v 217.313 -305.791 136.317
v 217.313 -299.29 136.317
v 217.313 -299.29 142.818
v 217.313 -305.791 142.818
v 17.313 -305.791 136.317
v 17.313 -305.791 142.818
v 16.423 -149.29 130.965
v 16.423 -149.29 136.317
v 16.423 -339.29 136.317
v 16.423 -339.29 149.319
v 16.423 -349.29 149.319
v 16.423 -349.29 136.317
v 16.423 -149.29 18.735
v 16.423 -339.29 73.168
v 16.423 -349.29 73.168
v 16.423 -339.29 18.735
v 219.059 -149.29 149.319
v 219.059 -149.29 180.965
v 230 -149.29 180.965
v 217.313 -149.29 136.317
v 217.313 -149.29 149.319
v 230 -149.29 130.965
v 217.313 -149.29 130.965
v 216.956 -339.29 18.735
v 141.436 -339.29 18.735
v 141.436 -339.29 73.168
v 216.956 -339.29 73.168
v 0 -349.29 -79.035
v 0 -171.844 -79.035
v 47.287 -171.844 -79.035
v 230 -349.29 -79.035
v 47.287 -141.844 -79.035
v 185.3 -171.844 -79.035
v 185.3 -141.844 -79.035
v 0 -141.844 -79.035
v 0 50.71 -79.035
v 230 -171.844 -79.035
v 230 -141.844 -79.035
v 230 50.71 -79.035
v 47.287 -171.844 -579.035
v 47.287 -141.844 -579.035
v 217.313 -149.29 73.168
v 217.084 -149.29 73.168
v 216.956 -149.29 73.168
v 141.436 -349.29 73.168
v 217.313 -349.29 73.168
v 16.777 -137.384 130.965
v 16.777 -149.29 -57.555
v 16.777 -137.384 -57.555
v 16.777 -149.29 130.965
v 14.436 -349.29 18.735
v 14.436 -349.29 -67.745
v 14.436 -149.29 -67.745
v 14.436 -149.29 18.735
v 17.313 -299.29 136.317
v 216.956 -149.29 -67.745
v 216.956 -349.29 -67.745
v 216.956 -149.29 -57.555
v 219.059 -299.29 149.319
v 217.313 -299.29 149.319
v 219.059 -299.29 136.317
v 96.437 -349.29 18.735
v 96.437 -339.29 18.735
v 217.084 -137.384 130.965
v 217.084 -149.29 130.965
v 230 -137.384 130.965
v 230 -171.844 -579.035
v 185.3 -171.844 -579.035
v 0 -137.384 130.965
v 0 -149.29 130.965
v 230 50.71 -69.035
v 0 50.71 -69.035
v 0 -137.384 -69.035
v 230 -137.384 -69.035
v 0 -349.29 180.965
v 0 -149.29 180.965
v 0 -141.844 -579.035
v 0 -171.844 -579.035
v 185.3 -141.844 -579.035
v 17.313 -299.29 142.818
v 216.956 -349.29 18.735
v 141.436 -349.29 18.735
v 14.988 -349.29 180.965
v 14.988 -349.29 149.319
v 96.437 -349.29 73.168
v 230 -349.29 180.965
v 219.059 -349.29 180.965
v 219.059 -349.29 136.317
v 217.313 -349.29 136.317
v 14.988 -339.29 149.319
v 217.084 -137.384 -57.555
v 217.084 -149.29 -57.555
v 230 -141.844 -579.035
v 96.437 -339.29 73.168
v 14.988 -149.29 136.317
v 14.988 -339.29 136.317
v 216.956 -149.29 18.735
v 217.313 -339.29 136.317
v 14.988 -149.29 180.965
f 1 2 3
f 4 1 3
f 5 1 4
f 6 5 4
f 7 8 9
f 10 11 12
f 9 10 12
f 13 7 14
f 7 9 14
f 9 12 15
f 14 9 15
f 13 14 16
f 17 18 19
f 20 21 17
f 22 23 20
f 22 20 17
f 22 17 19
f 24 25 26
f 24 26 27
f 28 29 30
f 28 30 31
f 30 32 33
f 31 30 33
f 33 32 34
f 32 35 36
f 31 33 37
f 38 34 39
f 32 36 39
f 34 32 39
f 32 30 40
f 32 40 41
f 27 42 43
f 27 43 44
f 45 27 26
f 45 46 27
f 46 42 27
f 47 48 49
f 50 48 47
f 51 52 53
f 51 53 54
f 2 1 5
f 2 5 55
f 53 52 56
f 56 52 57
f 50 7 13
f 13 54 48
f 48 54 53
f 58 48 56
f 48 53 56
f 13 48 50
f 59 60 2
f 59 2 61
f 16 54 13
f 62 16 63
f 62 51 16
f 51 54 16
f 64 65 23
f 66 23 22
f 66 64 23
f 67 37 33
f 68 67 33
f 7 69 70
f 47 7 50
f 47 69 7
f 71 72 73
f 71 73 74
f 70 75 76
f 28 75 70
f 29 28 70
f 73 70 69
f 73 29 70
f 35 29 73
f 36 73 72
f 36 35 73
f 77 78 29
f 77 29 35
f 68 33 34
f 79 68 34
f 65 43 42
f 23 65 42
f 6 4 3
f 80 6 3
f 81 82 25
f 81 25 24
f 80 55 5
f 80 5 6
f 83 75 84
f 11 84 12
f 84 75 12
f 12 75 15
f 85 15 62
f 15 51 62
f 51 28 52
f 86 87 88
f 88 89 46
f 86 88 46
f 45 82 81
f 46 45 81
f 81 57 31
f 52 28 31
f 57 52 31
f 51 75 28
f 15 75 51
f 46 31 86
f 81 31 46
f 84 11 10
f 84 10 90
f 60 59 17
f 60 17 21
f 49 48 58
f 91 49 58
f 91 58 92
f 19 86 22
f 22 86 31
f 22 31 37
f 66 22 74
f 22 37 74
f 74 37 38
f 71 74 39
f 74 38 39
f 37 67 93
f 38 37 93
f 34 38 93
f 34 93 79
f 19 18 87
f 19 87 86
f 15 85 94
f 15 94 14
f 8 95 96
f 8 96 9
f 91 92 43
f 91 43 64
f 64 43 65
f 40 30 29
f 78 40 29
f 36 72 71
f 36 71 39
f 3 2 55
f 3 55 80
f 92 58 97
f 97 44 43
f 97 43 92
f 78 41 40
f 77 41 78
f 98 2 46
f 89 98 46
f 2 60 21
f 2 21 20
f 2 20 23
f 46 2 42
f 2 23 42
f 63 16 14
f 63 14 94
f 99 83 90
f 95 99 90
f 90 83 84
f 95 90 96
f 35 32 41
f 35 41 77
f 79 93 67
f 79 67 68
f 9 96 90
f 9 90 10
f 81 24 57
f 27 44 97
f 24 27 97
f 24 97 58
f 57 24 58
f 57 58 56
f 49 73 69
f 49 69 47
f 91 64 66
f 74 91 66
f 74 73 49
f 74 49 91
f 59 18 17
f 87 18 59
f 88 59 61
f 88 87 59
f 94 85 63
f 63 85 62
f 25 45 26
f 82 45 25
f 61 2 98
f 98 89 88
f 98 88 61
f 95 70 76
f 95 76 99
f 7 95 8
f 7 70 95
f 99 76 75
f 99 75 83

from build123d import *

# Parameters (mm, degrees)
SKETCH_1_W           = 10
SKETCH_1_H           = 200
EXTRUDE_1_DEPTH      = 230
SKETCH_3_W           = 230
SKETCH_3_H           = 10
EXTRUDE_2_DEPTH      = 200
SKETCH_4_W           = 230
SKETCH_4_H           = 200
EXTRUDE_3_DEPTH      = 250
SKETCH_5_W           = 39.107317094
SKETCH_5_H           = 28.520826202
EXTRUDE_4_DEPTH      = 600
SKETCH_6_W           = 42.946967528
SKETCH_6_H           = 25.292733119
EXTRUDE_5_DEPTH      = 600
SKETCH_8_W           = 204.071070321
SKETCH_8_H           = 31.645680933
CUT_EXTRUDE_1_DEPTH  = 600
SKETCH_9_W           = 200.890651603
SKETCH_9_H           = 63.14903284
CUT_EXTRUDE_2_DEPTH  = 600
SKETCH_10_W          = 202.520583334
SKETCH_10_H          = 86.479719268
CUT_EXTRUDE_3_DEPTH  = 600
SKETCH_11_W          = 44.998390002
SKETCH_11_H          = 54.43327072
CUT_EXTRUDE_4_DEPTH  = 600
SKETCH_12_W          = 80.01436718
SKETCH_12_H          = 54.43327072
CUT_EXTRUDE_6_DEPTH  = 190
SKETCH_13_W          = 75.520724131
SKETCH_13_H          = 54.43327072
CUT_EXTRUDE_7_DEPTH  = 190
SKETCH_14_W          = 202.325132129
SKETCH_14_H          = 13.002129503
CUT_EXTRUDE_8_DEPTH  = 190
SKETCH_15_W          = 230
SKETCH_15_H          = 11.90568545
EXTRUDE_6_DEPTH      = 200
SKETCH_16_W          = 200.306698776
SKETCH_16_H          = 188.520008931
CUT_EXTRUDE_9_DEPTH  = 50
SKETCH_17_W          = 202.636589795
SKETCH_17_H          = 13.002129503
CUT_EXTRUDE_10_DEPTH = 50
SKETCH_18_W          = 6.501064751
SKETCH_18_H          = 6.501064751
EXTRUDE_9_DEPTH      = 200
SKETCH_19_W          = 39.107317094
SKETCH_19_H          = 50
CUT_EXTRUDE_11_DEPTH = 1000
SKETCH_20_W          = 42.946967528
SKETCH_20_H          = 50
CUT_EXTRUDE_12_DEPTH = 1000
SKETCH_21_W          = 39.107317094
SKETCH_21_H          = 50
CUT_EXTRUDE_13_DEPTH = 1000
SKETCH_22_W          = 42.946967528
SKETCH_22_H          = 50
CUT_EXTRUDE_14_DEPTH = 1000
SKETCH_23_W          = 39.107317094
SKETCH_23_H          = 28.520826202
CUT_EXTRUDE_15_DEPTH = 500
SKETCH_24_W          = 42.946967528
SKETCH_24_H          = 25.292733119
CUT_EXTRUDE_16_DEPTH = 500
SKETCH_25_W          = 44.7
SKETCH_25_H          = 30
SKETCH_25_W_2        = 47.286683307
EXTRUDE_10_DEPTH     = 500


with BuildPart() as part:
    # 草图1 → 凸台-拉伸1 (new body)
    with BuildSketch(Plane(origin=(0, 0, 0), x_dir=(0, 0, -1), z_dir=(1, 0, 0))):
        with Locations((74.034934024, -49.289724413)):
            Rectangle(SKETCH_1_W, SKETCH_1_H)
    extrude(amount=EXTRUDE_1_DEPTH)

    # 草图3 → 凸台-拉伸2 (add)
    with BuildSketch(Plane.XZ.offset(149.289724413)):
        with Locations((115, -74.034934024)):
            Rectangle(SKETCH_3_W, SKETCH_3_H)
    extrude(amount=EXTRUDE_2_DEPTH)

    # 草图4 → 凸台-拉伸3 (add)
    with BuildSketch(Plane.XY.offset(-69.034934024)):
        with Locations((115, -249.289724413)):
            Rectangle(SKETCH_4_W, SKETCH_4_H)
    extrude(amount=EXTRUDE_3_DEPTH)

    # 草图5 → 凸台-拉伸4 (add)
    with BuildSketch(Plane(origin=(0, 0, -79.034934024), x_dir=(-1, 0, 0), z_dir=(0, 0, -1))):
        with Locations((-19.553658547, -97.170506203)):
            Rectangle(SKETCH_5_W, SKETCH_5_H)
    extrude(amount=EXTRUDE_4_DEPTH)

    # 草图6 → 凸台-拉伸5 (add)
    with BuildSketch(Plane(origin=(0, 0, -79.034934024), x_dir=(-1, 0, 0), z_dir=(0, 0, -1))):
        with Locations((-208.526516236, -89.203945076)):
            Rectangle(SKETCH_6_W, SKETCH_6_H)
    extrude(amount=EXTRUDE_5_DEPTH)

    # 草图8 → 切除-拉伸1 (cut)
    with BuildSketch(Plane(origin=(0, -349.289724413, 0), x_dir=(-1, 0, 0), z_dir=(0, -1, 0))):
        with Locations((-117.023802755, -165.14222551)):
            Rectangle(SKETCH_8_W, SKETCH_8_H)
    extrude(amount=-CUT_EXTRUDE_1_DEPTH, mode=Mode.SUBTRACT)

    # 草图9 → 切除-拉伸2 (cut)
    with BuildSketch(Plane(origin=(0, -349.289724413, 0), x_dir=(-1, 0, 0), z_dir=(0, -1, 0))):
        with Locations((-116.868073921, -104.74273912)):
            Rectangle(SKETCH_9_W, SKETCH_9_H)
    extrude(amount=-CUT_EXTRUDE_2_DEPTH, mode=Mode.SUBTRACT)

    # 草图10 → 切除-拉伸3 (cut)
    with BuildSketch(Plane.XZ.offset(349.289724413)):
        with Locations((115.695937766, -24.504907654)):
            Rectangle(SKETCH_10_W, SKETCH_10_H)
    extrude(amount=-CUT_EXTRUDE_3_DEPTH, mode=Mode.SUBTRACT)

    # 草图11 → 切除-拉伸4 (cut)
    with BuildSketch(Plane(origin=(0, -349.289724413, 0), x_dir=(-1, 0, 0), z_dir=(0, -1, 0))):
        with Locations((-118.936310301, -45.95158734)):
            Rectangle(SKETCH_11_W, SKETCH_11_H)
    extrude(amount=-CUT_EXTRUDE_4_DEPTH, mode=Mode.SUBTRACT)

    # 草图12 → 切除-拉伸6 (cut)
    with BuildSketch(Plane(origin=(0, -149.289724413, 0), x_dir=(1, 0, 0), z_dir=(0, 1, 0))):
        with Locations((56.42993171, -45.95158734)):
            Rectangle(SKETCH_12_W, SKETCH_12_H)
    extrude(amount=-CUT_EXTRUDE_6_DEPTH, mode=Mode.SUBTRACT)

    # 草图13 → 切除-拉伸7 (cut)
    with BuildSketch(Plane(origin=(0, -149.289724413, 0), x_dir=(1, 0, 0), z_dir=(0, 1, 0))):
        with Locations((179.195867368, -45.95158734)):
            Rectangle(SKETCH_13_W, SKETCH_13_H)
    extrude(amount=-CUT_EXTRUDE_7_DEPTH, mode=Mode.SUBTRACT)

    # 草图14 → 切除-拉伸8 (cut)
    with BuildSketch(Plane(origin=(0, -149.289724413, 0), x_dir=(1, 0, 0), z_dir=(0, 1, 0))):
        with Locations((116.150833659, -142.818320292)):
            Rectangle(SKETCH_14_W, SKETCH_14_H)
    extrude(amount=-CUT_EXTRUDE_8_DEPTH, mode=Mode.SUBTRACT)

    # 草图15 → 凸台-拉伸6 (add)
    with BuildSketch(Plane.XY.offset(-69.034934024)):
        with Locations((115, -143.336881688)):
            Rectangle(SKETCH_15_W, SKETCH_15_H)
    extrude(amount=EXTRUDE_6_DEPTH)

    # 草图16 → 切除-拉伸9 (cut)
    with BuildSketch(Plane.XZ.offset(149.289724413)):
        with Locations((116.930548552, 36.705061511)):
            Rectangle(SKETCH_16_W, SKETCH_16_H)
    extrude(amount=-CUT_EXTRUDE_9_DEPTH, mode=Mode.SUBTRACT)

    # 草图17 → 切除-拉伸10 (cut)
    with BuildSketch(Plane.XZ.offset(349.289724413)):
        with Locations((117.741043018, 142.818320292)):
            Rectangle(SKETCH_17_W, SKETCH_17_H)
    extrude(amount=-CUT_EXTRUDE_10_DEPTH, mode=Mode.SUBTRACT)

    # 草图19 → 切除-拉伸11 (cut)
    with BuildSketch(Plane(origin=(0, -82.910093102, 0), x_dir=(1, 0, 0), z_dir=(0, 1, 0))):
        with Locations((19.553658547, 654.034934024)):
            Rectangle(SKETCH_19_W, SKETCH_19_H)
    extrude(amount=-CUT_EXTRUDE_11_DEPTH, mode=Mode.SUBTRACT)

    # 草图20 → 切除-拉伸12 (cut)
    with BuildSketch(Plane(origin=(0, -76.557578516, 0), x_dir=(1, 0, 0), z_dir=(0, 1, 0))):
        with Locations((208.526516236, 654.034934024)):
            Rectangle(SKETCH_20_W, SKETCH_20_H)
    extrude(amount=-CUT_EXTRUDE_12_DEPTH, mode=Mode.SUBTRACT)

    # 草图21 → 切除-拉伸13 (cut)
    with BuildSketch(Plane(origin=(0, -82.910093102, 0), x_dir=(1, 0, 0), z_dir=(0, 1, 0))):
        with Locations((19.553658547, 604.034934024)):
            Rectangle(SKETCH_21_W, SKETCH_21_H)
    extrude(amount=-CUT_EXTRUDE_13_DEPTH, mode=Mode.SUBTRACT)

    # 草图22 → 切除-拉伸14 (cut)
    with BuildSketch(Plane(origin=(0, -76.557578516, 0), x_dir=(1, 0, 0), z_dir=(0, 1, 0))):
        with Locations((208.526516236, 604.034934024)):
            Rectangle(SKETCH_22_W, SKETCH_22_H)
    extrude(amount=-CUT_EXTRUDE_14_DEPTH, mode=Mode.SUBTRACT)

    # 草图23 → 切除-拉伸15 (cut)
    with BuildSketch(Plane(origin=(0, 0, -579.034934024), x_dir=(-1, 0, 0), z_dir=(0, 0, -1))):
        with Locations((-19.553658547, -97.170506203)):
            Rectangle(SKETCH_23_W, SKETCH_23_H)
    extrude(amount=-CUT_EXTRUDE_15_DEPTH, mode=Mode.SUBTRACT)

    # 草图24 → 切除-拉伸16 (cut)
    with BuildSketch(Plane(origin=(0, 0, -579.034934024), x_dir=(-1, 0, 0), z_dir=(0, 0, -1))):
        with Locations((-208.526516236, -89.203945076)):
            Rectangle(SKETCH_24_W, SKETCH_24_H)
    extrude(amount=-CUT_EXTRUDE_16_DEPTH, mode=Mode.SUBTRACT)

    # 草图25 → 凸台-拉伸10 (add)
    with BuildSketch(Plane(origin=(0, 0, -79.034934024), x_dir=(-1, 0, 0), z_dir=(0, 0, -1))):
        with Locations((-207.65, -156.843853199)):
            Rectangle(SKETCH_25_W, SKETCH_25_H)
        with Locations((-23.643341654, -156.843853199)):
            Rectangle(SKETCH_25_W_2, SKETCH_25_H)
    extrude(amount=EXTRUDE_10_DEPTH)


with BuildPart() as body_2:
    # 草图18 → 凸台-拉伸9 (new body)
    with BuildSketch(Plane.ZY.offset(-217.313399723)):
        with Locations((139.567787916, -302.540256789)):
            Rectangle(SKETCH_18_W, SKETCH_18_H)
    extrude(amount=EXTRUDE_9_DEPTH)


solid = Compound([part.part, body_2.part])
